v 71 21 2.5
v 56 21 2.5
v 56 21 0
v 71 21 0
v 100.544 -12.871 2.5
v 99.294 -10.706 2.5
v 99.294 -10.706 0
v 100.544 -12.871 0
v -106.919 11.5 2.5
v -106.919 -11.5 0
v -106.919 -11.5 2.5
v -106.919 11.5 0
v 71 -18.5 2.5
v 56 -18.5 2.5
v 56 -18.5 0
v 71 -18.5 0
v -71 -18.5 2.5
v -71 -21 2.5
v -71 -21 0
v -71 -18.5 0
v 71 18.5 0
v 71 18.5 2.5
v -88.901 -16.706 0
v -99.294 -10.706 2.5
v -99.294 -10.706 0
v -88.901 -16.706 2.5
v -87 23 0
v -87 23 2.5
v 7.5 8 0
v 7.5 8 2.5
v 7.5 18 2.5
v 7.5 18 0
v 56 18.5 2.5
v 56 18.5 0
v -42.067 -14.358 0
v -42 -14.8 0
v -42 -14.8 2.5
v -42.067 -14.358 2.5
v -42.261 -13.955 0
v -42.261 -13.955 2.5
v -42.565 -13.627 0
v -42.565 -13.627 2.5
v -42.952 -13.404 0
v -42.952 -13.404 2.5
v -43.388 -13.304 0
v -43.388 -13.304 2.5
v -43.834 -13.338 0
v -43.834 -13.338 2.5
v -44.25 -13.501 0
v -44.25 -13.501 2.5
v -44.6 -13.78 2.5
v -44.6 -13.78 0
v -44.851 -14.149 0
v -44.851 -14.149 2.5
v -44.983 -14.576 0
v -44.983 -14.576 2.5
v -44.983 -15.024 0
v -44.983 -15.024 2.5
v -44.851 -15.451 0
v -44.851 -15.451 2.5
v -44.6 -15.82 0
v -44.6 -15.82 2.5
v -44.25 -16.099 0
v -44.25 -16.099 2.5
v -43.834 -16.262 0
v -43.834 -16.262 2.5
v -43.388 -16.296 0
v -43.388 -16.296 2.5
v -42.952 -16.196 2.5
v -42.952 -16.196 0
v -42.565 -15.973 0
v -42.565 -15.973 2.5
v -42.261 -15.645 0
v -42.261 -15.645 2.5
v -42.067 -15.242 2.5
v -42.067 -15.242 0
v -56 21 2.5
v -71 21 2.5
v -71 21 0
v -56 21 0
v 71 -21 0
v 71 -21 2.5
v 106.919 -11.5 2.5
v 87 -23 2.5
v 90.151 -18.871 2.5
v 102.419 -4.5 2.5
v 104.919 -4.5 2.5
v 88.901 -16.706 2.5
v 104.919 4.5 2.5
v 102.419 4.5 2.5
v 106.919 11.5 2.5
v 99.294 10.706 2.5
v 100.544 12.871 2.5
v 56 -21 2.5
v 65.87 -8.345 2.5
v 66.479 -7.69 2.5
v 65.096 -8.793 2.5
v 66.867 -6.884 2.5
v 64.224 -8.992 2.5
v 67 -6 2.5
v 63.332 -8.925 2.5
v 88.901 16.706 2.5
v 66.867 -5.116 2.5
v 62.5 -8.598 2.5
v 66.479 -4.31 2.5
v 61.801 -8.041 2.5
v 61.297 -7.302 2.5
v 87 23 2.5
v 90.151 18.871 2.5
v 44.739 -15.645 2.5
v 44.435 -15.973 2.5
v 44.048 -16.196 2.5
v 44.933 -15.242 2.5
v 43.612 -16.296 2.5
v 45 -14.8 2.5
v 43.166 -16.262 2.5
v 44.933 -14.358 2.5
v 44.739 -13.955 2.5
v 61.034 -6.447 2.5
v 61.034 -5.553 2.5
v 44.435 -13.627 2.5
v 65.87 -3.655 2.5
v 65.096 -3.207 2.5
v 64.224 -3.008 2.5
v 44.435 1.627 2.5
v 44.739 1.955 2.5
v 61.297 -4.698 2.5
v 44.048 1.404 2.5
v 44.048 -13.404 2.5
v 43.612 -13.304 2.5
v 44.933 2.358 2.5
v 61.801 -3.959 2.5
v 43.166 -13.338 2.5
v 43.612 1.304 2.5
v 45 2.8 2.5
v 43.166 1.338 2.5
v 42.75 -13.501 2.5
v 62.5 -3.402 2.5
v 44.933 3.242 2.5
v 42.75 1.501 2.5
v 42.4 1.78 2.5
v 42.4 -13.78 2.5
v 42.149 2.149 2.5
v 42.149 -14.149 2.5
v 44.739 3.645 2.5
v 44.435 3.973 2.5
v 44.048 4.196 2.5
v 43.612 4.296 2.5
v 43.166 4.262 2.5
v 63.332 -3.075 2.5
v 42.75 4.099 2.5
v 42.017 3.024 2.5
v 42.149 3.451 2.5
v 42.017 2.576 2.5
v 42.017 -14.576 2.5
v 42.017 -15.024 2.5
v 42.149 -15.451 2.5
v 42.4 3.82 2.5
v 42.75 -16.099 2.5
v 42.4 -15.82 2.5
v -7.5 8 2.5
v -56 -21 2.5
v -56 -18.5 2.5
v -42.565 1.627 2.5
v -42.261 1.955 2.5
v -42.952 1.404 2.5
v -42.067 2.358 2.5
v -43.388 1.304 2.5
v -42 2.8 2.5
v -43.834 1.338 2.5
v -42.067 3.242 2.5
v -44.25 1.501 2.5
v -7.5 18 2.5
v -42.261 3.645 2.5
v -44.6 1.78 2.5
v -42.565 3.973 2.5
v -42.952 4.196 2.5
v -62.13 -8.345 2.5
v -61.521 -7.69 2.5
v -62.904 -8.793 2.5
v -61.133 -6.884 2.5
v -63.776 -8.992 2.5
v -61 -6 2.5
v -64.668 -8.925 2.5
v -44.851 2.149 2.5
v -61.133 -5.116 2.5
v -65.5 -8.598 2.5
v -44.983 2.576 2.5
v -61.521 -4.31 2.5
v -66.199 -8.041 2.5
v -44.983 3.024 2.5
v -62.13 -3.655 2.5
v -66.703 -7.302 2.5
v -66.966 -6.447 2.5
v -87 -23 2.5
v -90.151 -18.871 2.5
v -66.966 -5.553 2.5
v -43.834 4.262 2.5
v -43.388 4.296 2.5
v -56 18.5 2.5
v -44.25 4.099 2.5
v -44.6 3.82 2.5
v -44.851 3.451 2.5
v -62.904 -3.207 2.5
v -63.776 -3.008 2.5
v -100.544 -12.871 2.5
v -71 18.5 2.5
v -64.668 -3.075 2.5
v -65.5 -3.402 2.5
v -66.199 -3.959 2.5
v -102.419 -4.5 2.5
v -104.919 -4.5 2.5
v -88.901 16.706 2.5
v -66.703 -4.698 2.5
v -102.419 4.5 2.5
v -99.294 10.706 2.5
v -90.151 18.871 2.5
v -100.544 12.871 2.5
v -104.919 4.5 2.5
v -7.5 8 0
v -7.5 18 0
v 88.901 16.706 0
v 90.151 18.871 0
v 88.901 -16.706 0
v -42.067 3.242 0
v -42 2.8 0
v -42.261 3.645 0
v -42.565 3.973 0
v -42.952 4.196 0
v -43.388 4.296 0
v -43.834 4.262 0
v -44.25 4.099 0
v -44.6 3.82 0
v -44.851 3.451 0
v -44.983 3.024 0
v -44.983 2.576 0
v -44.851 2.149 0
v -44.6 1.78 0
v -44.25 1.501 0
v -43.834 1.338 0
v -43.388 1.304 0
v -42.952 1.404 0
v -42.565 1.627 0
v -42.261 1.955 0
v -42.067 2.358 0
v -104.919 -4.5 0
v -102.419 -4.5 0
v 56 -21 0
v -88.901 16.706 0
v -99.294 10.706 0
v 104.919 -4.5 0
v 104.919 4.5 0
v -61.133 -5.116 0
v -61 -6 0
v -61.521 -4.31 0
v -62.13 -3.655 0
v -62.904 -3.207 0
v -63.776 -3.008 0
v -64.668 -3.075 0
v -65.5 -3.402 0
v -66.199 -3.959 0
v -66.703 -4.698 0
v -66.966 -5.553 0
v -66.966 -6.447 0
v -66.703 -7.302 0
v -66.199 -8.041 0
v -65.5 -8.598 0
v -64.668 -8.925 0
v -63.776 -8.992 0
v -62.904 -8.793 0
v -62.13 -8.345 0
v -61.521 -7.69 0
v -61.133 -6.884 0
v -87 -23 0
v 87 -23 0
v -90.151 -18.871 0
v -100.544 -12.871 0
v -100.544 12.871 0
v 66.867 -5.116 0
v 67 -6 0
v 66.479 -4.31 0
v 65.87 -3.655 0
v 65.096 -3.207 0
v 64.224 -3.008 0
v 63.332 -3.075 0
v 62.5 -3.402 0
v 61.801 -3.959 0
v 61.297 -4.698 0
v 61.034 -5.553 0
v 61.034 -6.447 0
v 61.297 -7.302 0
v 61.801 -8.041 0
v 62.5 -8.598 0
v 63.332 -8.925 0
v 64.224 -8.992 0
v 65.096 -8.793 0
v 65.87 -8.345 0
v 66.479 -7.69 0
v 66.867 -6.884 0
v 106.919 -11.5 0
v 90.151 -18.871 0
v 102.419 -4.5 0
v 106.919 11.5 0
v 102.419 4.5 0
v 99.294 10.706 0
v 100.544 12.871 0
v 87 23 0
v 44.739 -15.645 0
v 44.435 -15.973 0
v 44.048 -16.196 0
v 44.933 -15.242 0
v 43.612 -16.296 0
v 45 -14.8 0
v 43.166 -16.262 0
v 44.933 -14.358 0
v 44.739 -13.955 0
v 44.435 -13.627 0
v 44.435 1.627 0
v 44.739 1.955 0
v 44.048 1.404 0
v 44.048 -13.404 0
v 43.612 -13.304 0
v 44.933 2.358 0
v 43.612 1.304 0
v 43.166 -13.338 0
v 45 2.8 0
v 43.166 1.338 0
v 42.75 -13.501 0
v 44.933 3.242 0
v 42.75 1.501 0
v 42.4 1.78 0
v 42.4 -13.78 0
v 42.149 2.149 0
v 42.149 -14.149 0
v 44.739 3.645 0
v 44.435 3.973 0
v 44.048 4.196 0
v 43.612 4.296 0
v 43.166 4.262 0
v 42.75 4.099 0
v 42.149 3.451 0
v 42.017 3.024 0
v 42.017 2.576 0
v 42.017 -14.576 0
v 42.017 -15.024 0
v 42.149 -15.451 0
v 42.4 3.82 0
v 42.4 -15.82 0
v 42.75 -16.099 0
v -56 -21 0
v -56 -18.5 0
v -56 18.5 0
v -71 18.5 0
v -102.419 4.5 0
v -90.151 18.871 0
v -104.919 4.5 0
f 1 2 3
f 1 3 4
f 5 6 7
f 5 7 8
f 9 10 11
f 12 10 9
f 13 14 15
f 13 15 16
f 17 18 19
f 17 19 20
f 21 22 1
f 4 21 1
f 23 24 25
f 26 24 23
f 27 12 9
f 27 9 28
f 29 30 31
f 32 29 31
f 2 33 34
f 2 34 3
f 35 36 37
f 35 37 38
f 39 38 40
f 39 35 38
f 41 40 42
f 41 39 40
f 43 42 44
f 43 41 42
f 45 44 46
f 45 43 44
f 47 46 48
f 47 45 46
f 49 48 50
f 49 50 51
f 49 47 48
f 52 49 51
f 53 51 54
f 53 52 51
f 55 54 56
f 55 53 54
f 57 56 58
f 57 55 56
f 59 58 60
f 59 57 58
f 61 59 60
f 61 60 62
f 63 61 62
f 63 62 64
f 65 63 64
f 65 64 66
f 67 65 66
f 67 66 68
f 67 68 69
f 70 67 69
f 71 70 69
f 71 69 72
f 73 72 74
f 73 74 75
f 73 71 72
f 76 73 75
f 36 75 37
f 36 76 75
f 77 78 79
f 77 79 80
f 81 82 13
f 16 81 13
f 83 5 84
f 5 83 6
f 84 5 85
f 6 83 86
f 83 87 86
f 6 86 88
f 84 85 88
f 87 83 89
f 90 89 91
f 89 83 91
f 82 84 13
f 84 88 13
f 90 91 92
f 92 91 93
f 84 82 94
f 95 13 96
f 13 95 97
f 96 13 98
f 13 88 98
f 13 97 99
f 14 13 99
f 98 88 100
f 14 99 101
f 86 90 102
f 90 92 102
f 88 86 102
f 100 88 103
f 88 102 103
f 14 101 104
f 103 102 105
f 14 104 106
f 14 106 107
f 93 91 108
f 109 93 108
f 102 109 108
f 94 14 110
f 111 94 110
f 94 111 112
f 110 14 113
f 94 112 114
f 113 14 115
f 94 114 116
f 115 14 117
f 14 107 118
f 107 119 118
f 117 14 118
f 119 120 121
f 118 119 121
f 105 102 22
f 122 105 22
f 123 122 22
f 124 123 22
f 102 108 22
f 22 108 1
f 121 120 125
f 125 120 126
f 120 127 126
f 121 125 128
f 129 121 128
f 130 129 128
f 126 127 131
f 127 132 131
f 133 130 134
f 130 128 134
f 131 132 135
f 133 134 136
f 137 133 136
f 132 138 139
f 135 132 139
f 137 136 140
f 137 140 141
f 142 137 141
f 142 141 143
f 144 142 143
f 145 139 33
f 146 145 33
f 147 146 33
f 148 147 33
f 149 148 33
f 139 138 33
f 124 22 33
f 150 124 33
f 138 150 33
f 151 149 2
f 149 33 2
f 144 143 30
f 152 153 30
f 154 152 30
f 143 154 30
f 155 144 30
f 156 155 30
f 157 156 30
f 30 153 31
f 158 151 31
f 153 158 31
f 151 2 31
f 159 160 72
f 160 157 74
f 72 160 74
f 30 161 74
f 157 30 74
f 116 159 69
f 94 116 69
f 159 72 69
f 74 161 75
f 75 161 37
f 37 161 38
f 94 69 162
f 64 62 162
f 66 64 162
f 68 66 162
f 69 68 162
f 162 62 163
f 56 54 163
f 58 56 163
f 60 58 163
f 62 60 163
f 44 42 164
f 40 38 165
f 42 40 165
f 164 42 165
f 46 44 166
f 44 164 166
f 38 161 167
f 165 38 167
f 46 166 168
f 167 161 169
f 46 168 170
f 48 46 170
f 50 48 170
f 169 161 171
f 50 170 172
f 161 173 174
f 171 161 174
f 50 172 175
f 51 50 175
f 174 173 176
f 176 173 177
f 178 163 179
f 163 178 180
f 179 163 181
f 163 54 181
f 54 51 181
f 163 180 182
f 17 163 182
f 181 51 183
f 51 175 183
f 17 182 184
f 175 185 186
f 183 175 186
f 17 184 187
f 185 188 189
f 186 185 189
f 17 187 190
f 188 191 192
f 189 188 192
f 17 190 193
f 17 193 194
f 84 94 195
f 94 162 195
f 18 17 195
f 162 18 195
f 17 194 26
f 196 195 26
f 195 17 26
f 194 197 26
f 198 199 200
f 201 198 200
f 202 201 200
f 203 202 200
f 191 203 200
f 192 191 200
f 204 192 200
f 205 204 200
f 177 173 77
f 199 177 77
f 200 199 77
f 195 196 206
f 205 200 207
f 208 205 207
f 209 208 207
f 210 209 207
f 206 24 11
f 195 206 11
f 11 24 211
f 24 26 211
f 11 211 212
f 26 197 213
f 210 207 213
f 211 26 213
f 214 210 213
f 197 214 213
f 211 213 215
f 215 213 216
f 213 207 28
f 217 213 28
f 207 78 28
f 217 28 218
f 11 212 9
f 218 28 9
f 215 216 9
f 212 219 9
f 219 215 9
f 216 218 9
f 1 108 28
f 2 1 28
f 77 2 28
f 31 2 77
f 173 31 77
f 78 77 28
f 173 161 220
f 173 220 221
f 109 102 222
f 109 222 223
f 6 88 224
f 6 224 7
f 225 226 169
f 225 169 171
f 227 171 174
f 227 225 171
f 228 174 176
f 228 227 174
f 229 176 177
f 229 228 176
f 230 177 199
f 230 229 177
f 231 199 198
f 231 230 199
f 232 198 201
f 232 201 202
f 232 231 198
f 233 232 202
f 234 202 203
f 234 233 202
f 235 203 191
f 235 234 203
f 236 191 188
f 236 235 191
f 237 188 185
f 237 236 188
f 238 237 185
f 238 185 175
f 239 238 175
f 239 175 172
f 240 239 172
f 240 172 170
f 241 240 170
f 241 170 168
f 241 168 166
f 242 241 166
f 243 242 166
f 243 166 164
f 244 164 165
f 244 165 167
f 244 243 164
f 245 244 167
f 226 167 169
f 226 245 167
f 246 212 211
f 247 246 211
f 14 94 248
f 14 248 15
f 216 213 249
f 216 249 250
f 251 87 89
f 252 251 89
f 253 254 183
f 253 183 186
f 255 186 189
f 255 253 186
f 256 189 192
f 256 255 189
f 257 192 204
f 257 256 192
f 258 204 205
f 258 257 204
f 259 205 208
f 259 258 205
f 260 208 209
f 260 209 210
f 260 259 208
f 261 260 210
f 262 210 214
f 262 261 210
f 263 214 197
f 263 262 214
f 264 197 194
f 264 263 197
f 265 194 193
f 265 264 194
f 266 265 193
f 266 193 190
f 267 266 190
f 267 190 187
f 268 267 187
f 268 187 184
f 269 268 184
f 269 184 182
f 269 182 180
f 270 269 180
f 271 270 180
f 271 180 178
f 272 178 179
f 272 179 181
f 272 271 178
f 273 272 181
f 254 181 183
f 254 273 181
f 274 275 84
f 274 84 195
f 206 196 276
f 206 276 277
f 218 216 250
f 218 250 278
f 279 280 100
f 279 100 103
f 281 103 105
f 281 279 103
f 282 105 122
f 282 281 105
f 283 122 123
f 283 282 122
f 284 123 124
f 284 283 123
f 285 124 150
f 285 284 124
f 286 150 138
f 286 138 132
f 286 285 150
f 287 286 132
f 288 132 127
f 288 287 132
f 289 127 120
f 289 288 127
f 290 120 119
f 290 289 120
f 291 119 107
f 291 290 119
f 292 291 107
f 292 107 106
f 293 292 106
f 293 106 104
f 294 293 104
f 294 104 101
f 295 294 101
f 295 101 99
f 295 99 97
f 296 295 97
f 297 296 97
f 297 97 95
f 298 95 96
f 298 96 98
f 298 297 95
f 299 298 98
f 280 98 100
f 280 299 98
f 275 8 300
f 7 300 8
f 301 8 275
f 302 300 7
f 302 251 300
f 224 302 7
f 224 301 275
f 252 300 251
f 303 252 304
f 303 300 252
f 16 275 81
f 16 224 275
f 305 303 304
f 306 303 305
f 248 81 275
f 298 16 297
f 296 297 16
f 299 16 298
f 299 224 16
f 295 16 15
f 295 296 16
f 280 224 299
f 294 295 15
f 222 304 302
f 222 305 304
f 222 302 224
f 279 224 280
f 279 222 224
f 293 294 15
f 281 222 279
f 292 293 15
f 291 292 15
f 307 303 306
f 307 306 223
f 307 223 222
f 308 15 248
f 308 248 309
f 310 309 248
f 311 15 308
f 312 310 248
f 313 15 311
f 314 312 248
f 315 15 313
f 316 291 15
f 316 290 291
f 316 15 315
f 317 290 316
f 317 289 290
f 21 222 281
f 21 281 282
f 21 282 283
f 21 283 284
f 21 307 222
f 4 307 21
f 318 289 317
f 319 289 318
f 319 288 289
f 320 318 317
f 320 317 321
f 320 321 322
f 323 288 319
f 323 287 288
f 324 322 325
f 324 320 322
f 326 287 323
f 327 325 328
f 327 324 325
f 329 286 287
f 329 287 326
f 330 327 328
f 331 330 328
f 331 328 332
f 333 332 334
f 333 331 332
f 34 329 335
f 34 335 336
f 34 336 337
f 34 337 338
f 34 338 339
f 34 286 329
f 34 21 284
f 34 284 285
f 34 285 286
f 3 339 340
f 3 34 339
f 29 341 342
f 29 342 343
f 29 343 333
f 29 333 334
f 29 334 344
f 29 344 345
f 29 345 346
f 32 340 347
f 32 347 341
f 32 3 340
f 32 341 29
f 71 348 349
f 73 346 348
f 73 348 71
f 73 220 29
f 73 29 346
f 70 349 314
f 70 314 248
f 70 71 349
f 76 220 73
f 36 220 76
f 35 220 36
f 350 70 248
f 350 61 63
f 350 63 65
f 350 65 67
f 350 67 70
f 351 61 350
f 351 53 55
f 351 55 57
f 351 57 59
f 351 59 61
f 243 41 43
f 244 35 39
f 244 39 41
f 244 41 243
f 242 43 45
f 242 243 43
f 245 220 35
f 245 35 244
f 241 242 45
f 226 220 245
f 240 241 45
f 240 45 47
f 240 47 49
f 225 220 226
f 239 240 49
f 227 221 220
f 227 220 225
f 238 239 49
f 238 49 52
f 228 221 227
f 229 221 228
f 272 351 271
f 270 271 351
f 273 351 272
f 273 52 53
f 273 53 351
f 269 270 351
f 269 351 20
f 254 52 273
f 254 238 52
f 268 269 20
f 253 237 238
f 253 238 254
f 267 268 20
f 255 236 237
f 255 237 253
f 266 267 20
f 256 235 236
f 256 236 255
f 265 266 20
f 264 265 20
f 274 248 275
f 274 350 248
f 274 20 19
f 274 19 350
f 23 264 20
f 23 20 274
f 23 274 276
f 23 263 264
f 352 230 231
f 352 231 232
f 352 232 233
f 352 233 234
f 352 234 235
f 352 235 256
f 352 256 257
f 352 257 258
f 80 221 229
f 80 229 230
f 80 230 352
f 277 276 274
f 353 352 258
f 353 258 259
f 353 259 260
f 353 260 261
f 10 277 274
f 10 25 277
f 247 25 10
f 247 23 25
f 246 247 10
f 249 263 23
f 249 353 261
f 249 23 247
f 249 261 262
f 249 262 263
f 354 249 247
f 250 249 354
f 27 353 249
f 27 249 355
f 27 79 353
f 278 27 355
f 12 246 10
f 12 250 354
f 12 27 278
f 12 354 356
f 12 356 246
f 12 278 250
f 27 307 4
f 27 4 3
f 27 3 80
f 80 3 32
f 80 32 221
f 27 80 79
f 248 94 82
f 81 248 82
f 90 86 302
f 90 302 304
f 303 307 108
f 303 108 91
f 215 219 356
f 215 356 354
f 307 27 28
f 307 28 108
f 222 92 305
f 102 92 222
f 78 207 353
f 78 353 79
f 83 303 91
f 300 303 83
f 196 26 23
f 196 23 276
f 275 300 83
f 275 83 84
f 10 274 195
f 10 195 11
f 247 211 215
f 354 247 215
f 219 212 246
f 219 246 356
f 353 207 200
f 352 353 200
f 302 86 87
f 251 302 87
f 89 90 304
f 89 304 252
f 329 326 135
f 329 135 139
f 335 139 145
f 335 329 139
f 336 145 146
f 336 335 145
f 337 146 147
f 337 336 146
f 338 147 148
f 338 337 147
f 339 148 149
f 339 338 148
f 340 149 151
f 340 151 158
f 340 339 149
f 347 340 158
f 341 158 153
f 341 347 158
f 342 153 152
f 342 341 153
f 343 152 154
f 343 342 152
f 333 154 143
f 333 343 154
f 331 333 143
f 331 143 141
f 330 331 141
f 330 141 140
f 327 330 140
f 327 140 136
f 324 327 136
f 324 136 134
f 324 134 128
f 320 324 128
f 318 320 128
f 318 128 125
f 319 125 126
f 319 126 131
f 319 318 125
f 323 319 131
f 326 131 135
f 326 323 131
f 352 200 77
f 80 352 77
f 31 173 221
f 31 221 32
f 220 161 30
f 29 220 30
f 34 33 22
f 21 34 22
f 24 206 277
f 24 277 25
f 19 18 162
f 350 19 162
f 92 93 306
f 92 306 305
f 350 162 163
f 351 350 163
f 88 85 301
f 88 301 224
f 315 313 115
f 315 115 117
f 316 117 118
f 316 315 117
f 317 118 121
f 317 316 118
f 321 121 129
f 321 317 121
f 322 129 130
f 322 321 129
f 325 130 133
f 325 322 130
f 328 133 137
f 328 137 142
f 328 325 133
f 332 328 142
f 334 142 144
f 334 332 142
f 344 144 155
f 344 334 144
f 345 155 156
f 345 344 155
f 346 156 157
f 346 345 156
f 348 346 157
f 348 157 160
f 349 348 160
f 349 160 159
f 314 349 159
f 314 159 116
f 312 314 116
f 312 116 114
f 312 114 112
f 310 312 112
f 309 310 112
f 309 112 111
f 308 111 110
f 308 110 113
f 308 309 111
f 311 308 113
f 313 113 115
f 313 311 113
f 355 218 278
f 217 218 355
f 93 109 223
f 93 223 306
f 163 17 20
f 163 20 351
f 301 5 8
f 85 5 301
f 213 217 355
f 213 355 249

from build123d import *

# Parameters (mm, degrees)
SKETCH1_R           = 1.5
SKETCH1_R_2         = 3
BOSS_EXTRUDE1_DEPTH = 2.5
SKETCH2_W           = 15
SKETCH2_H           = 2.5
CUT_EXTRUDE1_DEPTH  = 3
CUT_EXTRUDE2_DEPTH  = 3
SKETCH4_W           = 2.5
SKETCH4_H           = 9
CUT_EXTRUDE3_DEPTH  = 12
SKETCH5_W           = 15
SKETCH5_H           = 10
CUT_EXTRUDE4_DEPTH  = 2.5


with BuildPart() as part:
    # Sketch1 → Boss-Extrude1 (new body)
    with BuildSketch(Plane.XY):
        Polygon((87, 23), (106.918584287, 11.5), (106.918584287, -11.5), (87, -23), (-87, -23), (-106.918584287, -11.5), (-106.918584287, 11.5), (-87, 23), align=None)
        with Locations((43.5, -14.8)):
            Circle(SKETCH1_R, mode=Mode.SUBTRACT)
        with Locations((-43.5, 2.8)):
            Circle(SKETCH1_R, mode=Mode.SUBTRACT)
        with Locations((-43.5, -14.8)):
            Circle(SKETCH1_R, mode=Mode.SUBTRACT)
        with Locations((-64, -6)):
            Circle(SKETCH1_R_2, mode=Mode.SUBTRACT)
        with Locations((43.5, 2.8)):
            Circle(SKETCH1_R, mode=Mode.SUBTRACT)
        with Locations((64, -6)):
            Circle(SKETCH1_R_2, mode=Mode.SUBTRACT)
    extrude(amount=BOSS_EXTRUDE1_DEPTH)

    # Sketch2 → Cut-Extrude1 (cut)
    with BuildSketch(Plane.XY.offset(2.5)):
        with Locations((-63.5, 19.75)):
            Rectangle(SKETCH2_W, SKETCH2_H)
        with Locations((-63.5, -19.75)):
            Rectangle(SKETCH2_W, SKETCH2_H)
        with Locations((63.5, -19.75)):
            Rectangle(SKETCH2_W, SKETCH2_H)
        with Locations((63.5, 19.75)):
            Rectangle(SKETCH2_W, SKETCH2_H)
    extrude(amount=-CUT_EXTRUDE1_DEPTH, mode=Mode.SUBTRACT)

    # Sketch3 → Cut-Extrude2 (cut)
    with BuildSketch(Plane.XY.offset(2.5)):
        Polygon((-90.151279442, 18.871206889), (-88.901279442, 16.70614338), (-99.293584287, 10.70614338), (-100.543584287, 12.871206889), align=None)
        Polygon((-88.901279442, -16.70614338), (-90.151279442, -18.871206889), (-100.543584287, -12.871206889), (-99.293584287, -10.70614338), align=None)
        Polygon((99.293584287, -10.70614338), (100.543584287, -12.871206889), (90.151279442, -18.871206889), (88.901279442, -16.70614338), align=None)
        Polygon((100.543584287, 12.871206889), (99.293584287, 10.70614338), (88.901279442, 16.70614338), (90.151279442, 18.871206889), align=None)
    extrude(amount=-CUT_EXTRUDE2_DEPTH, mode=Mode.SUBTRACT)

    # Sketch4 → Cut-Extrude3 (cut)
    with BuildSketch(Plane.XY.offset(2.5)):
        with Locations((-103.668584287, 0)):
            Rectangle(SKETCH4_W, SKETCH4_H)
        with Locations((103.668584287, 0)):
            Rectangle(SKETCH4_W, SKETCH4_H)
    extrude(amount=-CUT_EXTRUDE3_DEPTH, mode=Mode.SUBTRACT)

    # Sketch5 → Cut-Extrude4 (cut)
    with BuildSketch(Plane.XY.offset(2.5)):
        with Locations((0, 13)):
            Rectangle(SKETCH5_W, SKETCH5_H)
    extrude(amount=-CUT_EXTRUDE4_DEPTH, mode=Mode.SUBTRACT)


solid = part.part
